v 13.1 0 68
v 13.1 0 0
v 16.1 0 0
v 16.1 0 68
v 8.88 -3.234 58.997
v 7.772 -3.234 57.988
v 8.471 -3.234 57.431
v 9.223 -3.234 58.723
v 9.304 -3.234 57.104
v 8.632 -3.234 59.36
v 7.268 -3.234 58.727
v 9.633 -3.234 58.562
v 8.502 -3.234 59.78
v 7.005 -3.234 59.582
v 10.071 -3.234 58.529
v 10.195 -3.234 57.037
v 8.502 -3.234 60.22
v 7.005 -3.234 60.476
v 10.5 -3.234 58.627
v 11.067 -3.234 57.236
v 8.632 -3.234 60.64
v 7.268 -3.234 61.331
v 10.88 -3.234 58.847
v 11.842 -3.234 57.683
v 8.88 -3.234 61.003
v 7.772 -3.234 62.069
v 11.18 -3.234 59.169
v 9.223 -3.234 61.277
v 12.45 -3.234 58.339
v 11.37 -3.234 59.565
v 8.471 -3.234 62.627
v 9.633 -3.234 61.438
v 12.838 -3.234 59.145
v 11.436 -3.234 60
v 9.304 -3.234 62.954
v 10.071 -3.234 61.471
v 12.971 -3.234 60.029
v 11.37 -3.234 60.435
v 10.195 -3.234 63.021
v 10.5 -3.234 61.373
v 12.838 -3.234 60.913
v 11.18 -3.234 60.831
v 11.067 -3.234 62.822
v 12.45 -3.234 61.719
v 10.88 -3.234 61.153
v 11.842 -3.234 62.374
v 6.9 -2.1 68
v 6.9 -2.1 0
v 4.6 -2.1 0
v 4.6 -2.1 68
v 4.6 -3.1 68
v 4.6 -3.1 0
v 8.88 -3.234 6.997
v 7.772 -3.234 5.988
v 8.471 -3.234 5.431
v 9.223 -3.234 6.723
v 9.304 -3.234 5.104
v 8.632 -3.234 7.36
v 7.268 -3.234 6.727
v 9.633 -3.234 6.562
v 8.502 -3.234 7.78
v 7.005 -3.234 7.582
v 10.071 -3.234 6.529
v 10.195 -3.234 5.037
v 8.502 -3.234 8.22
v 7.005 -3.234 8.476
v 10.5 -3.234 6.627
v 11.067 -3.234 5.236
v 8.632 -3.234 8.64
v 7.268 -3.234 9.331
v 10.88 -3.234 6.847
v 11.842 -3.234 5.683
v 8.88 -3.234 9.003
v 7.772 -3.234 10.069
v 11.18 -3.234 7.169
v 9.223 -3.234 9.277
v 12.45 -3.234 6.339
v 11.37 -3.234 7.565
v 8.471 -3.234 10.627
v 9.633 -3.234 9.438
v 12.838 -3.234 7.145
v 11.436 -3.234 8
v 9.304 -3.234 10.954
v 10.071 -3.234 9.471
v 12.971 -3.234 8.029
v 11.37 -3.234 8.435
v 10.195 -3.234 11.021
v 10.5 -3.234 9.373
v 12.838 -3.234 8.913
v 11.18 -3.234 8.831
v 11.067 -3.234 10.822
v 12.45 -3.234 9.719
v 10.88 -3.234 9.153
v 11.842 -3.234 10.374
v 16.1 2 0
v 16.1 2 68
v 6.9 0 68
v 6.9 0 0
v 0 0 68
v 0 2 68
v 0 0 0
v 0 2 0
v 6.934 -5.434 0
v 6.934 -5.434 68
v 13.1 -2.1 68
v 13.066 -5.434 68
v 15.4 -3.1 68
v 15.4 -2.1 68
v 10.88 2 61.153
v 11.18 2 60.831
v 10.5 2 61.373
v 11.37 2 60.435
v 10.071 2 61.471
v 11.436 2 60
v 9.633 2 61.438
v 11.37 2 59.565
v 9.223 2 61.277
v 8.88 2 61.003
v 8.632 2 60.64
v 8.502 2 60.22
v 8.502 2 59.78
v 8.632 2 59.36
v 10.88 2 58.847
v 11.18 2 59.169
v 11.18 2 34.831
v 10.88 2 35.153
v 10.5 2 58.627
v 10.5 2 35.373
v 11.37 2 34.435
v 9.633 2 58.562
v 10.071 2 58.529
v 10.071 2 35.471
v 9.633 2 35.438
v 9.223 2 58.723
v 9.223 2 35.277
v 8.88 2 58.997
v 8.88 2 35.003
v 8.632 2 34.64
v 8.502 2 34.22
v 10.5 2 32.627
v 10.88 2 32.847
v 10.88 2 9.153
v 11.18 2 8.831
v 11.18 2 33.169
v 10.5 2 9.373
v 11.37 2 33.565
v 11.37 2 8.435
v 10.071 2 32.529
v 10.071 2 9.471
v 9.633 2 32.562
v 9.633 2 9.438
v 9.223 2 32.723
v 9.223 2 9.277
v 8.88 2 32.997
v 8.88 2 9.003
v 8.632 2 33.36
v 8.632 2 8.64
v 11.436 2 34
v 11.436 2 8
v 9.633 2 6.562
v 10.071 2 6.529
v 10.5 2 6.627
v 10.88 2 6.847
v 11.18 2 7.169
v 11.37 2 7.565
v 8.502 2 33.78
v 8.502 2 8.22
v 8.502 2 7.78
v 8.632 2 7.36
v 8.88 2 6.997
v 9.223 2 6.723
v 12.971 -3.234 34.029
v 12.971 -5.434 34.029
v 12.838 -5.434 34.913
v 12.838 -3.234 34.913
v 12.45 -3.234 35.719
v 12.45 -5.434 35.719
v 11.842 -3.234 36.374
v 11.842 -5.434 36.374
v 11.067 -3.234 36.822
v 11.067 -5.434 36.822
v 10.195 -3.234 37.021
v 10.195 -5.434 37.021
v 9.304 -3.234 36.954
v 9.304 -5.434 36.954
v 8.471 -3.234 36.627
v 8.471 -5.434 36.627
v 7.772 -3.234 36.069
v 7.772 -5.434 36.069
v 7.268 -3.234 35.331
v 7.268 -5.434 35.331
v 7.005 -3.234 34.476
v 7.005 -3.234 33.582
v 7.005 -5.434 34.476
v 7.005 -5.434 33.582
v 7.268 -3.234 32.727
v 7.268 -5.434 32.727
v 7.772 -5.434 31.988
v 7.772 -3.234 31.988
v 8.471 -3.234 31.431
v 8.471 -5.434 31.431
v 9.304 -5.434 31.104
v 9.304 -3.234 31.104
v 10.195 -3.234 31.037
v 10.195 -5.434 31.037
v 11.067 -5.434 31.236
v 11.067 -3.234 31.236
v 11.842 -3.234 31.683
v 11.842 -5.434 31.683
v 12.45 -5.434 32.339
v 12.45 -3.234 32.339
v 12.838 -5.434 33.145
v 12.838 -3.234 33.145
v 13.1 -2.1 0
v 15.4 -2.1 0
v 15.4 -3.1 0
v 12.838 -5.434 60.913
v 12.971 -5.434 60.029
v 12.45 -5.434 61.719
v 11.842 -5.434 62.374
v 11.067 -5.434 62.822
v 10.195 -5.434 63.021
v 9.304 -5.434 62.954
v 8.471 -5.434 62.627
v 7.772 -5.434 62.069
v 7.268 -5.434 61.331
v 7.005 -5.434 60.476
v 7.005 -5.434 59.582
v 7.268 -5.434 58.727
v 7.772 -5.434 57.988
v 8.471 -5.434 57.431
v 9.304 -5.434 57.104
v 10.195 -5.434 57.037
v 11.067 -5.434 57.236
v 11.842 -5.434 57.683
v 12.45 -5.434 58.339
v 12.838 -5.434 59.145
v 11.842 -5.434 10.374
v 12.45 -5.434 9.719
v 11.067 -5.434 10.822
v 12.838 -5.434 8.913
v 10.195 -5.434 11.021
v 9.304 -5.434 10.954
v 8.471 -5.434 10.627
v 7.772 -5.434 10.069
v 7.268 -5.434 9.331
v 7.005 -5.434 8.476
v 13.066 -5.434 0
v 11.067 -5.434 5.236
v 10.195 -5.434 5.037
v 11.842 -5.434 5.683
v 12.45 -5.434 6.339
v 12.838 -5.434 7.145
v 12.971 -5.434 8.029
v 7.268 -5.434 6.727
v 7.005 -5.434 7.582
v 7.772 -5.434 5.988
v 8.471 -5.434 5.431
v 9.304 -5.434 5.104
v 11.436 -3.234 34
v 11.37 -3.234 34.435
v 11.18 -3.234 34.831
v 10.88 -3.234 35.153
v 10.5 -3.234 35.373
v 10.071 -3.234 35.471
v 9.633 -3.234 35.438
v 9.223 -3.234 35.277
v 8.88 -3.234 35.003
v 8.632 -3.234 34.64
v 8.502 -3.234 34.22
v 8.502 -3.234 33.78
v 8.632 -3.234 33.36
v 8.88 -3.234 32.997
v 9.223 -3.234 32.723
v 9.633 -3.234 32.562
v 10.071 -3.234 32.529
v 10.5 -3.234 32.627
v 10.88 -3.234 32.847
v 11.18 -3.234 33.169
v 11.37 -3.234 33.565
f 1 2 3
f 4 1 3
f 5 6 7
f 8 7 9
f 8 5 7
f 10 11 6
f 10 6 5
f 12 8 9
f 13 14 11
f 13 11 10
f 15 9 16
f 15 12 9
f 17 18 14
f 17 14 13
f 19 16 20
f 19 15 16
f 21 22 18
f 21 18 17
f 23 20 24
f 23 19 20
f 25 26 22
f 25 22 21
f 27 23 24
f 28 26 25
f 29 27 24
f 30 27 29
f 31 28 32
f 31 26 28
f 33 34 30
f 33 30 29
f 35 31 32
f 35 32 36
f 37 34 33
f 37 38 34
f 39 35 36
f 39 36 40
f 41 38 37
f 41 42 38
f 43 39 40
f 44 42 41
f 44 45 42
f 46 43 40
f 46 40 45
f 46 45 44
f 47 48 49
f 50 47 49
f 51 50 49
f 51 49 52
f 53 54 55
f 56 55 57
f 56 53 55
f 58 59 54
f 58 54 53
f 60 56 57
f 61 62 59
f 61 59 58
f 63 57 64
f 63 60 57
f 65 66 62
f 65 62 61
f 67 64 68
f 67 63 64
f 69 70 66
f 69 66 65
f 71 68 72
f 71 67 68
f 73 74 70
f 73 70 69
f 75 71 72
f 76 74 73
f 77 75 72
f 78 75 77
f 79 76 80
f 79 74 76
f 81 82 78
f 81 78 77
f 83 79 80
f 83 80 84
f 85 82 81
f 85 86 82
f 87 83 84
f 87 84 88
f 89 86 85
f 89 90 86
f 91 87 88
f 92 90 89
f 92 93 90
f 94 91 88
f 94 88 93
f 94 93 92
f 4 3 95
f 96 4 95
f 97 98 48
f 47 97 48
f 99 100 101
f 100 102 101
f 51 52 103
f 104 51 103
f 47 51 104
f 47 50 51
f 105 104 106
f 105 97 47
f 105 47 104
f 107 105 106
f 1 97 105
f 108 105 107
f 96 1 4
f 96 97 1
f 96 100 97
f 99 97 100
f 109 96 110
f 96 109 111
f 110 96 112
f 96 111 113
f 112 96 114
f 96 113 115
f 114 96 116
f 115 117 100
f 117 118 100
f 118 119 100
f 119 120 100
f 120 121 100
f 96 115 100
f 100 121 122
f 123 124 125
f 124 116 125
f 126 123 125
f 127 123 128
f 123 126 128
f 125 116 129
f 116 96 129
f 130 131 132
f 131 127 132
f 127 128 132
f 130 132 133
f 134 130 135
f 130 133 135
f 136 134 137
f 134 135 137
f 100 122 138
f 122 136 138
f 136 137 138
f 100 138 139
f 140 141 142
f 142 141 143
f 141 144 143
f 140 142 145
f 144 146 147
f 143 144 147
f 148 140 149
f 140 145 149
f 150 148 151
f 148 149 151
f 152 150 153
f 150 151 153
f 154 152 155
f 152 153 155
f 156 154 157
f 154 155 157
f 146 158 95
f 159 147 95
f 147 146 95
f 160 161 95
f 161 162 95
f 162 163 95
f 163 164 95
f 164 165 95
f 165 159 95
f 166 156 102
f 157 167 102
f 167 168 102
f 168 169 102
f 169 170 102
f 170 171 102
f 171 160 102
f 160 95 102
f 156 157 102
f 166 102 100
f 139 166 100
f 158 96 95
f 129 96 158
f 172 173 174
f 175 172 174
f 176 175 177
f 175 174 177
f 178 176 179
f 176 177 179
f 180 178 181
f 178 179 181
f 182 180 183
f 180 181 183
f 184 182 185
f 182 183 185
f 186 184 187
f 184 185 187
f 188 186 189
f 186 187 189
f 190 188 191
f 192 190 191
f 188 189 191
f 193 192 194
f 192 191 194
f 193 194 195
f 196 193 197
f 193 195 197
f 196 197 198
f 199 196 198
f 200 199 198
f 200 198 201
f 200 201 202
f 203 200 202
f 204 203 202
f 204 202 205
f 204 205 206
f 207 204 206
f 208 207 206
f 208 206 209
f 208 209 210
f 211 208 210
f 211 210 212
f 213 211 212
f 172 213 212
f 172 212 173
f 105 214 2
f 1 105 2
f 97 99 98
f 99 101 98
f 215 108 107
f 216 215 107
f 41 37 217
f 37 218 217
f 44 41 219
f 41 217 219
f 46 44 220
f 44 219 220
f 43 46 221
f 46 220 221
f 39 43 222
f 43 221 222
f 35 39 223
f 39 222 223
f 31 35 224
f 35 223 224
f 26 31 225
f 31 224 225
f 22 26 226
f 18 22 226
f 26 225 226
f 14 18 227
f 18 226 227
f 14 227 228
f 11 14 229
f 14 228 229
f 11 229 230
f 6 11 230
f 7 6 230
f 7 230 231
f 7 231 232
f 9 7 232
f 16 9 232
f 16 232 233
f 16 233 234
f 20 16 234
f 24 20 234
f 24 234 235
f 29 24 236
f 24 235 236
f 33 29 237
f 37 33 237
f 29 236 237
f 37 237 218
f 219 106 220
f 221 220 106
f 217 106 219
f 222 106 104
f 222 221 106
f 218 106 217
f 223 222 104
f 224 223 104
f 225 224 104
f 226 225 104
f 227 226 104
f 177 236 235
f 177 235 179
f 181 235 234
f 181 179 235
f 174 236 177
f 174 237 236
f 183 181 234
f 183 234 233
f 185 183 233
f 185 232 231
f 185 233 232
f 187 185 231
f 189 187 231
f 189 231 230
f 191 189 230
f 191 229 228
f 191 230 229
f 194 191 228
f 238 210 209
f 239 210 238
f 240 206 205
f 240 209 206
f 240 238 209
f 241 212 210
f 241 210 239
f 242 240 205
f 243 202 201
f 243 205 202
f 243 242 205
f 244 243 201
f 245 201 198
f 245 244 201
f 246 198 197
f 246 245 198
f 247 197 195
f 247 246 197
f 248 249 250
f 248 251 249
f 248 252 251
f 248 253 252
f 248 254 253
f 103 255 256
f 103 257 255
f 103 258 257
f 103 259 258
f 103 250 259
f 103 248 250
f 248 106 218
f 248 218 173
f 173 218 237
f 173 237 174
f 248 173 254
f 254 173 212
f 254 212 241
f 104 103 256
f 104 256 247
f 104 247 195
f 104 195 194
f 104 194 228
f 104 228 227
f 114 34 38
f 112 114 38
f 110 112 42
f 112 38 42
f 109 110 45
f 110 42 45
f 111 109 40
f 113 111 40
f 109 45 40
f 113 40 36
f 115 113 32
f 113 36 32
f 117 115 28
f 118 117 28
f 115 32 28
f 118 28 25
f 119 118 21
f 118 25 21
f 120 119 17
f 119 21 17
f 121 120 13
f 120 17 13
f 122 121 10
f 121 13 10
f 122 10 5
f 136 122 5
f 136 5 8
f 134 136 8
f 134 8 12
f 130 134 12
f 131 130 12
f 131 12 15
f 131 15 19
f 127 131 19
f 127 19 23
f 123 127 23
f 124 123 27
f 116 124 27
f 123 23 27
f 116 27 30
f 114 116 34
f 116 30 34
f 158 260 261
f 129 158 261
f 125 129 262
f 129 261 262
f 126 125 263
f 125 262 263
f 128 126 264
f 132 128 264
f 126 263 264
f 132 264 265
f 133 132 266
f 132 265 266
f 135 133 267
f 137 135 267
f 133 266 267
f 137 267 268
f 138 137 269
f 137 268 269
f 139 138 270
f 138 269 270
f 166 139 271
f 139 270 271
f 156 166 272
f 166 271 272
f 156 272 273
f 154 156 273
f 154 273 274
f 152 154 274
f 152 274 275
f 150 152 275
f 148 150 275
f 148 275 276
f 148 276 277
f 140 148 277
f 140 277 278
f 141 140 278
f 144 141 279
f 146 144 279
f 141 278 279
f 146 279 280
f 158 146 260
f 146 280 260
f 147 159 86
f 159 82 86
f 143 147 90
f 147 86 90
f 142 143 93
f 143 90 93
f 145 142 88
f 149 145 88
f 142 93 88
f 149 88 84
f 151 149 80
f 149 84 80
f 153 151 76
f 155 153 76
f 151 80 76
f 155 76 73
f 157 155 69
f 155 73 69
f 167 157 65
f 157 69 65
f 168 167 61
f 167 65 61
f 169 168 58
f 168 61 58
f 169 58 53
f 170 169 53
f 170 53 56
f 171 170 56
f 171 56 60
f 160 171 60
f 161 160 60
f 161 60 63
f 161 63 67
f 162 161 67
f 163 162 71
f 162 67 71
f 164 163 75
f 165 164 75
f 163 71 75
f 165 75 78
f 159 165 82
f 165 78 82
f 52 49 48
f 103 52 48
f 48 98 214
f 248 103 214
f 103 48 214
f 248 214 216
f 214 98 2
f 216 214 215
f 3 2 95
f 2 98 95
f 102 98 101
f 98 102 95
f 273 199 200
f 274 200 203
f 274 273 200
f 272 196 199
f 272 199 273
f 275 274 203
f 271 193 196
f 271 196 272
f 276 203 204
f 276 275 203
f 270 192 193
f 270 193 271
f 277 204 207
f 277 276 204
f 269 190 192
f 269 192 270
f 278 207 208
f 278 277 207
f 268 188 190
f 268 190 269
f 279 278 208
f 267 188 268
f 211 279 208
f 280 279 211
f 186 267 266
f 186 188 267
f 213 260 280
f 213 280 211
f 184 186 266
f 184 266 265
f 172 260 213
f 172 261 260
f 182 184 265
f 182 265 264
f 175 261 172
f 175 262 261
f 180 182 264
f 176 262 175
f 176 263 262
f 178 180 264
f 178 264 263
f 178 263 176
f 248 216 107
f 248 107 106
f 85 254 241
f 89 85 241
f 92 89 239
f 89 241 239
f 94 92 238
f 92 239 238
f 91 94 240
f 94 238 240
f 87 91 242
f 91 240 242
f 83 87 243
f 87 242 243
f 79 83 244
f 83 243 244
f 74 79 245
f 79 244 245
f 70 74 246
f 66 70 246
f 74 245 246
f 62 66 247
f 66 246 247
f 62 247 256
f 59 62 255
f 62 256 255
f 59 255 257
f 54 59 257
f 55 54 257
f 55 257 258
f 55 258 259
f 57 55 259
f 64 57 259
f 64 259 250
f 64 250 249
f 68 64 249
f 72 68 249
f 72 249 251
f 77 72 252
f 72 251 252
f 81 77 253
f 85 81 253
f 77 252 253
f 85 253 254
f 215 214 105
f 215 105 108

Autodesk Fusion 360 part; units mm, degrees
sketch "Sketch1" plane through (0, 0, 0) normal (0, 0, 1) x (1, 0, 0)
  line L0 (0, 0) -> (6.9, 0)
  line L1 (6.9, 0) -> (6.9, -2.1)
  line L2 (6.9, -2.1) -> (4.6, -2.1)
  line L3 (4.6, -2.1) -> (4.6, -3.1)
  line L4 (4.6, -3.1) -> (6.9335, -5.4335)
  line L5 (4.6, -3.1) -> (7.9, -3.1) construction
  line L6 (4.6, -2.1) -> (10.8, -2.1)
  line L7 (6.9, -2.1) -> (13.1, -2.1)
  line L8 (13.1, -2.1) -> (15.4, -2.1)
  line L9 (15.4, -2.1) -> (15.4, -3.1)
  line L10 (15.4, -3.1) -> (13.0665, -5.4335)
  line L11 (13.0665, -5.4335) -> (6.9335, -5.4335)
  line L12 (15.4, -2.1) -> (13.1, -2.1)
  line L13 (13.1, -2.1) -> (13.1, 0)
  line L14 (13.1, 0) -> (16.1, 0)
  line L15 (16.1, 0) -> (16.1, 2)
  line L16 (16.1, 2) -> (0, 2)
  line L17 (0, 2) -> (0, 0)
  dimension "d1" = 6.9
  dimension "d2" = 2.1
  dimension "d3" = 2.3
  dimension "d4" = 1
  dimension "d5" = 45
  dimension "d6" = 3.3
  dimension "d7" = 6.2
  dimension "d11" = 6.2
  dimension "d12" = 135
  dimension "d13" = 3.3
  dimension "d14" = 3
extrude "Extrude1" add sketch "Sketch1" along normal blind 68
sketch "Sketch11" plane through (0, -5.4335, 0) normal (0, -1, 0) x (1, 0, 0)
  line L0 (6.9335, 0) -> (13.0665, 0)
  line L1 (13.0665, 0) -> (13.0665, 68)
  line L2 (13.0665, 68) -> (6.9335, 68)
  line L3 (6.9335, 68) -> (6.9335, 0)
  circle A0 centre (9.9608, 60) radius 1.475
  dimension "d119" = 2.95
  dimension "d126" = 8
extrude "Extrude33" cut sketch "Sketch11" against normal blind 10 contours A0
pattern_linear "R-Pattern1" count 3 spacing 26 along (0, 0, -1) of "Extrude33"
sketch "Sketch12" plane through (0, -5.4335, 0) normal (0, -1, 0) x (1, 0, 0)
  circle A0 centre (9.9713, 60.0289) radius 3
  dimension "d127" = 6
extrude "Extrude34" cut sketch "Sketch12" against normal blind 2.2
pattern_linear "R-Pattern2" count 3 spacing 26 along (0, 0, -1) of "Extrude34"
